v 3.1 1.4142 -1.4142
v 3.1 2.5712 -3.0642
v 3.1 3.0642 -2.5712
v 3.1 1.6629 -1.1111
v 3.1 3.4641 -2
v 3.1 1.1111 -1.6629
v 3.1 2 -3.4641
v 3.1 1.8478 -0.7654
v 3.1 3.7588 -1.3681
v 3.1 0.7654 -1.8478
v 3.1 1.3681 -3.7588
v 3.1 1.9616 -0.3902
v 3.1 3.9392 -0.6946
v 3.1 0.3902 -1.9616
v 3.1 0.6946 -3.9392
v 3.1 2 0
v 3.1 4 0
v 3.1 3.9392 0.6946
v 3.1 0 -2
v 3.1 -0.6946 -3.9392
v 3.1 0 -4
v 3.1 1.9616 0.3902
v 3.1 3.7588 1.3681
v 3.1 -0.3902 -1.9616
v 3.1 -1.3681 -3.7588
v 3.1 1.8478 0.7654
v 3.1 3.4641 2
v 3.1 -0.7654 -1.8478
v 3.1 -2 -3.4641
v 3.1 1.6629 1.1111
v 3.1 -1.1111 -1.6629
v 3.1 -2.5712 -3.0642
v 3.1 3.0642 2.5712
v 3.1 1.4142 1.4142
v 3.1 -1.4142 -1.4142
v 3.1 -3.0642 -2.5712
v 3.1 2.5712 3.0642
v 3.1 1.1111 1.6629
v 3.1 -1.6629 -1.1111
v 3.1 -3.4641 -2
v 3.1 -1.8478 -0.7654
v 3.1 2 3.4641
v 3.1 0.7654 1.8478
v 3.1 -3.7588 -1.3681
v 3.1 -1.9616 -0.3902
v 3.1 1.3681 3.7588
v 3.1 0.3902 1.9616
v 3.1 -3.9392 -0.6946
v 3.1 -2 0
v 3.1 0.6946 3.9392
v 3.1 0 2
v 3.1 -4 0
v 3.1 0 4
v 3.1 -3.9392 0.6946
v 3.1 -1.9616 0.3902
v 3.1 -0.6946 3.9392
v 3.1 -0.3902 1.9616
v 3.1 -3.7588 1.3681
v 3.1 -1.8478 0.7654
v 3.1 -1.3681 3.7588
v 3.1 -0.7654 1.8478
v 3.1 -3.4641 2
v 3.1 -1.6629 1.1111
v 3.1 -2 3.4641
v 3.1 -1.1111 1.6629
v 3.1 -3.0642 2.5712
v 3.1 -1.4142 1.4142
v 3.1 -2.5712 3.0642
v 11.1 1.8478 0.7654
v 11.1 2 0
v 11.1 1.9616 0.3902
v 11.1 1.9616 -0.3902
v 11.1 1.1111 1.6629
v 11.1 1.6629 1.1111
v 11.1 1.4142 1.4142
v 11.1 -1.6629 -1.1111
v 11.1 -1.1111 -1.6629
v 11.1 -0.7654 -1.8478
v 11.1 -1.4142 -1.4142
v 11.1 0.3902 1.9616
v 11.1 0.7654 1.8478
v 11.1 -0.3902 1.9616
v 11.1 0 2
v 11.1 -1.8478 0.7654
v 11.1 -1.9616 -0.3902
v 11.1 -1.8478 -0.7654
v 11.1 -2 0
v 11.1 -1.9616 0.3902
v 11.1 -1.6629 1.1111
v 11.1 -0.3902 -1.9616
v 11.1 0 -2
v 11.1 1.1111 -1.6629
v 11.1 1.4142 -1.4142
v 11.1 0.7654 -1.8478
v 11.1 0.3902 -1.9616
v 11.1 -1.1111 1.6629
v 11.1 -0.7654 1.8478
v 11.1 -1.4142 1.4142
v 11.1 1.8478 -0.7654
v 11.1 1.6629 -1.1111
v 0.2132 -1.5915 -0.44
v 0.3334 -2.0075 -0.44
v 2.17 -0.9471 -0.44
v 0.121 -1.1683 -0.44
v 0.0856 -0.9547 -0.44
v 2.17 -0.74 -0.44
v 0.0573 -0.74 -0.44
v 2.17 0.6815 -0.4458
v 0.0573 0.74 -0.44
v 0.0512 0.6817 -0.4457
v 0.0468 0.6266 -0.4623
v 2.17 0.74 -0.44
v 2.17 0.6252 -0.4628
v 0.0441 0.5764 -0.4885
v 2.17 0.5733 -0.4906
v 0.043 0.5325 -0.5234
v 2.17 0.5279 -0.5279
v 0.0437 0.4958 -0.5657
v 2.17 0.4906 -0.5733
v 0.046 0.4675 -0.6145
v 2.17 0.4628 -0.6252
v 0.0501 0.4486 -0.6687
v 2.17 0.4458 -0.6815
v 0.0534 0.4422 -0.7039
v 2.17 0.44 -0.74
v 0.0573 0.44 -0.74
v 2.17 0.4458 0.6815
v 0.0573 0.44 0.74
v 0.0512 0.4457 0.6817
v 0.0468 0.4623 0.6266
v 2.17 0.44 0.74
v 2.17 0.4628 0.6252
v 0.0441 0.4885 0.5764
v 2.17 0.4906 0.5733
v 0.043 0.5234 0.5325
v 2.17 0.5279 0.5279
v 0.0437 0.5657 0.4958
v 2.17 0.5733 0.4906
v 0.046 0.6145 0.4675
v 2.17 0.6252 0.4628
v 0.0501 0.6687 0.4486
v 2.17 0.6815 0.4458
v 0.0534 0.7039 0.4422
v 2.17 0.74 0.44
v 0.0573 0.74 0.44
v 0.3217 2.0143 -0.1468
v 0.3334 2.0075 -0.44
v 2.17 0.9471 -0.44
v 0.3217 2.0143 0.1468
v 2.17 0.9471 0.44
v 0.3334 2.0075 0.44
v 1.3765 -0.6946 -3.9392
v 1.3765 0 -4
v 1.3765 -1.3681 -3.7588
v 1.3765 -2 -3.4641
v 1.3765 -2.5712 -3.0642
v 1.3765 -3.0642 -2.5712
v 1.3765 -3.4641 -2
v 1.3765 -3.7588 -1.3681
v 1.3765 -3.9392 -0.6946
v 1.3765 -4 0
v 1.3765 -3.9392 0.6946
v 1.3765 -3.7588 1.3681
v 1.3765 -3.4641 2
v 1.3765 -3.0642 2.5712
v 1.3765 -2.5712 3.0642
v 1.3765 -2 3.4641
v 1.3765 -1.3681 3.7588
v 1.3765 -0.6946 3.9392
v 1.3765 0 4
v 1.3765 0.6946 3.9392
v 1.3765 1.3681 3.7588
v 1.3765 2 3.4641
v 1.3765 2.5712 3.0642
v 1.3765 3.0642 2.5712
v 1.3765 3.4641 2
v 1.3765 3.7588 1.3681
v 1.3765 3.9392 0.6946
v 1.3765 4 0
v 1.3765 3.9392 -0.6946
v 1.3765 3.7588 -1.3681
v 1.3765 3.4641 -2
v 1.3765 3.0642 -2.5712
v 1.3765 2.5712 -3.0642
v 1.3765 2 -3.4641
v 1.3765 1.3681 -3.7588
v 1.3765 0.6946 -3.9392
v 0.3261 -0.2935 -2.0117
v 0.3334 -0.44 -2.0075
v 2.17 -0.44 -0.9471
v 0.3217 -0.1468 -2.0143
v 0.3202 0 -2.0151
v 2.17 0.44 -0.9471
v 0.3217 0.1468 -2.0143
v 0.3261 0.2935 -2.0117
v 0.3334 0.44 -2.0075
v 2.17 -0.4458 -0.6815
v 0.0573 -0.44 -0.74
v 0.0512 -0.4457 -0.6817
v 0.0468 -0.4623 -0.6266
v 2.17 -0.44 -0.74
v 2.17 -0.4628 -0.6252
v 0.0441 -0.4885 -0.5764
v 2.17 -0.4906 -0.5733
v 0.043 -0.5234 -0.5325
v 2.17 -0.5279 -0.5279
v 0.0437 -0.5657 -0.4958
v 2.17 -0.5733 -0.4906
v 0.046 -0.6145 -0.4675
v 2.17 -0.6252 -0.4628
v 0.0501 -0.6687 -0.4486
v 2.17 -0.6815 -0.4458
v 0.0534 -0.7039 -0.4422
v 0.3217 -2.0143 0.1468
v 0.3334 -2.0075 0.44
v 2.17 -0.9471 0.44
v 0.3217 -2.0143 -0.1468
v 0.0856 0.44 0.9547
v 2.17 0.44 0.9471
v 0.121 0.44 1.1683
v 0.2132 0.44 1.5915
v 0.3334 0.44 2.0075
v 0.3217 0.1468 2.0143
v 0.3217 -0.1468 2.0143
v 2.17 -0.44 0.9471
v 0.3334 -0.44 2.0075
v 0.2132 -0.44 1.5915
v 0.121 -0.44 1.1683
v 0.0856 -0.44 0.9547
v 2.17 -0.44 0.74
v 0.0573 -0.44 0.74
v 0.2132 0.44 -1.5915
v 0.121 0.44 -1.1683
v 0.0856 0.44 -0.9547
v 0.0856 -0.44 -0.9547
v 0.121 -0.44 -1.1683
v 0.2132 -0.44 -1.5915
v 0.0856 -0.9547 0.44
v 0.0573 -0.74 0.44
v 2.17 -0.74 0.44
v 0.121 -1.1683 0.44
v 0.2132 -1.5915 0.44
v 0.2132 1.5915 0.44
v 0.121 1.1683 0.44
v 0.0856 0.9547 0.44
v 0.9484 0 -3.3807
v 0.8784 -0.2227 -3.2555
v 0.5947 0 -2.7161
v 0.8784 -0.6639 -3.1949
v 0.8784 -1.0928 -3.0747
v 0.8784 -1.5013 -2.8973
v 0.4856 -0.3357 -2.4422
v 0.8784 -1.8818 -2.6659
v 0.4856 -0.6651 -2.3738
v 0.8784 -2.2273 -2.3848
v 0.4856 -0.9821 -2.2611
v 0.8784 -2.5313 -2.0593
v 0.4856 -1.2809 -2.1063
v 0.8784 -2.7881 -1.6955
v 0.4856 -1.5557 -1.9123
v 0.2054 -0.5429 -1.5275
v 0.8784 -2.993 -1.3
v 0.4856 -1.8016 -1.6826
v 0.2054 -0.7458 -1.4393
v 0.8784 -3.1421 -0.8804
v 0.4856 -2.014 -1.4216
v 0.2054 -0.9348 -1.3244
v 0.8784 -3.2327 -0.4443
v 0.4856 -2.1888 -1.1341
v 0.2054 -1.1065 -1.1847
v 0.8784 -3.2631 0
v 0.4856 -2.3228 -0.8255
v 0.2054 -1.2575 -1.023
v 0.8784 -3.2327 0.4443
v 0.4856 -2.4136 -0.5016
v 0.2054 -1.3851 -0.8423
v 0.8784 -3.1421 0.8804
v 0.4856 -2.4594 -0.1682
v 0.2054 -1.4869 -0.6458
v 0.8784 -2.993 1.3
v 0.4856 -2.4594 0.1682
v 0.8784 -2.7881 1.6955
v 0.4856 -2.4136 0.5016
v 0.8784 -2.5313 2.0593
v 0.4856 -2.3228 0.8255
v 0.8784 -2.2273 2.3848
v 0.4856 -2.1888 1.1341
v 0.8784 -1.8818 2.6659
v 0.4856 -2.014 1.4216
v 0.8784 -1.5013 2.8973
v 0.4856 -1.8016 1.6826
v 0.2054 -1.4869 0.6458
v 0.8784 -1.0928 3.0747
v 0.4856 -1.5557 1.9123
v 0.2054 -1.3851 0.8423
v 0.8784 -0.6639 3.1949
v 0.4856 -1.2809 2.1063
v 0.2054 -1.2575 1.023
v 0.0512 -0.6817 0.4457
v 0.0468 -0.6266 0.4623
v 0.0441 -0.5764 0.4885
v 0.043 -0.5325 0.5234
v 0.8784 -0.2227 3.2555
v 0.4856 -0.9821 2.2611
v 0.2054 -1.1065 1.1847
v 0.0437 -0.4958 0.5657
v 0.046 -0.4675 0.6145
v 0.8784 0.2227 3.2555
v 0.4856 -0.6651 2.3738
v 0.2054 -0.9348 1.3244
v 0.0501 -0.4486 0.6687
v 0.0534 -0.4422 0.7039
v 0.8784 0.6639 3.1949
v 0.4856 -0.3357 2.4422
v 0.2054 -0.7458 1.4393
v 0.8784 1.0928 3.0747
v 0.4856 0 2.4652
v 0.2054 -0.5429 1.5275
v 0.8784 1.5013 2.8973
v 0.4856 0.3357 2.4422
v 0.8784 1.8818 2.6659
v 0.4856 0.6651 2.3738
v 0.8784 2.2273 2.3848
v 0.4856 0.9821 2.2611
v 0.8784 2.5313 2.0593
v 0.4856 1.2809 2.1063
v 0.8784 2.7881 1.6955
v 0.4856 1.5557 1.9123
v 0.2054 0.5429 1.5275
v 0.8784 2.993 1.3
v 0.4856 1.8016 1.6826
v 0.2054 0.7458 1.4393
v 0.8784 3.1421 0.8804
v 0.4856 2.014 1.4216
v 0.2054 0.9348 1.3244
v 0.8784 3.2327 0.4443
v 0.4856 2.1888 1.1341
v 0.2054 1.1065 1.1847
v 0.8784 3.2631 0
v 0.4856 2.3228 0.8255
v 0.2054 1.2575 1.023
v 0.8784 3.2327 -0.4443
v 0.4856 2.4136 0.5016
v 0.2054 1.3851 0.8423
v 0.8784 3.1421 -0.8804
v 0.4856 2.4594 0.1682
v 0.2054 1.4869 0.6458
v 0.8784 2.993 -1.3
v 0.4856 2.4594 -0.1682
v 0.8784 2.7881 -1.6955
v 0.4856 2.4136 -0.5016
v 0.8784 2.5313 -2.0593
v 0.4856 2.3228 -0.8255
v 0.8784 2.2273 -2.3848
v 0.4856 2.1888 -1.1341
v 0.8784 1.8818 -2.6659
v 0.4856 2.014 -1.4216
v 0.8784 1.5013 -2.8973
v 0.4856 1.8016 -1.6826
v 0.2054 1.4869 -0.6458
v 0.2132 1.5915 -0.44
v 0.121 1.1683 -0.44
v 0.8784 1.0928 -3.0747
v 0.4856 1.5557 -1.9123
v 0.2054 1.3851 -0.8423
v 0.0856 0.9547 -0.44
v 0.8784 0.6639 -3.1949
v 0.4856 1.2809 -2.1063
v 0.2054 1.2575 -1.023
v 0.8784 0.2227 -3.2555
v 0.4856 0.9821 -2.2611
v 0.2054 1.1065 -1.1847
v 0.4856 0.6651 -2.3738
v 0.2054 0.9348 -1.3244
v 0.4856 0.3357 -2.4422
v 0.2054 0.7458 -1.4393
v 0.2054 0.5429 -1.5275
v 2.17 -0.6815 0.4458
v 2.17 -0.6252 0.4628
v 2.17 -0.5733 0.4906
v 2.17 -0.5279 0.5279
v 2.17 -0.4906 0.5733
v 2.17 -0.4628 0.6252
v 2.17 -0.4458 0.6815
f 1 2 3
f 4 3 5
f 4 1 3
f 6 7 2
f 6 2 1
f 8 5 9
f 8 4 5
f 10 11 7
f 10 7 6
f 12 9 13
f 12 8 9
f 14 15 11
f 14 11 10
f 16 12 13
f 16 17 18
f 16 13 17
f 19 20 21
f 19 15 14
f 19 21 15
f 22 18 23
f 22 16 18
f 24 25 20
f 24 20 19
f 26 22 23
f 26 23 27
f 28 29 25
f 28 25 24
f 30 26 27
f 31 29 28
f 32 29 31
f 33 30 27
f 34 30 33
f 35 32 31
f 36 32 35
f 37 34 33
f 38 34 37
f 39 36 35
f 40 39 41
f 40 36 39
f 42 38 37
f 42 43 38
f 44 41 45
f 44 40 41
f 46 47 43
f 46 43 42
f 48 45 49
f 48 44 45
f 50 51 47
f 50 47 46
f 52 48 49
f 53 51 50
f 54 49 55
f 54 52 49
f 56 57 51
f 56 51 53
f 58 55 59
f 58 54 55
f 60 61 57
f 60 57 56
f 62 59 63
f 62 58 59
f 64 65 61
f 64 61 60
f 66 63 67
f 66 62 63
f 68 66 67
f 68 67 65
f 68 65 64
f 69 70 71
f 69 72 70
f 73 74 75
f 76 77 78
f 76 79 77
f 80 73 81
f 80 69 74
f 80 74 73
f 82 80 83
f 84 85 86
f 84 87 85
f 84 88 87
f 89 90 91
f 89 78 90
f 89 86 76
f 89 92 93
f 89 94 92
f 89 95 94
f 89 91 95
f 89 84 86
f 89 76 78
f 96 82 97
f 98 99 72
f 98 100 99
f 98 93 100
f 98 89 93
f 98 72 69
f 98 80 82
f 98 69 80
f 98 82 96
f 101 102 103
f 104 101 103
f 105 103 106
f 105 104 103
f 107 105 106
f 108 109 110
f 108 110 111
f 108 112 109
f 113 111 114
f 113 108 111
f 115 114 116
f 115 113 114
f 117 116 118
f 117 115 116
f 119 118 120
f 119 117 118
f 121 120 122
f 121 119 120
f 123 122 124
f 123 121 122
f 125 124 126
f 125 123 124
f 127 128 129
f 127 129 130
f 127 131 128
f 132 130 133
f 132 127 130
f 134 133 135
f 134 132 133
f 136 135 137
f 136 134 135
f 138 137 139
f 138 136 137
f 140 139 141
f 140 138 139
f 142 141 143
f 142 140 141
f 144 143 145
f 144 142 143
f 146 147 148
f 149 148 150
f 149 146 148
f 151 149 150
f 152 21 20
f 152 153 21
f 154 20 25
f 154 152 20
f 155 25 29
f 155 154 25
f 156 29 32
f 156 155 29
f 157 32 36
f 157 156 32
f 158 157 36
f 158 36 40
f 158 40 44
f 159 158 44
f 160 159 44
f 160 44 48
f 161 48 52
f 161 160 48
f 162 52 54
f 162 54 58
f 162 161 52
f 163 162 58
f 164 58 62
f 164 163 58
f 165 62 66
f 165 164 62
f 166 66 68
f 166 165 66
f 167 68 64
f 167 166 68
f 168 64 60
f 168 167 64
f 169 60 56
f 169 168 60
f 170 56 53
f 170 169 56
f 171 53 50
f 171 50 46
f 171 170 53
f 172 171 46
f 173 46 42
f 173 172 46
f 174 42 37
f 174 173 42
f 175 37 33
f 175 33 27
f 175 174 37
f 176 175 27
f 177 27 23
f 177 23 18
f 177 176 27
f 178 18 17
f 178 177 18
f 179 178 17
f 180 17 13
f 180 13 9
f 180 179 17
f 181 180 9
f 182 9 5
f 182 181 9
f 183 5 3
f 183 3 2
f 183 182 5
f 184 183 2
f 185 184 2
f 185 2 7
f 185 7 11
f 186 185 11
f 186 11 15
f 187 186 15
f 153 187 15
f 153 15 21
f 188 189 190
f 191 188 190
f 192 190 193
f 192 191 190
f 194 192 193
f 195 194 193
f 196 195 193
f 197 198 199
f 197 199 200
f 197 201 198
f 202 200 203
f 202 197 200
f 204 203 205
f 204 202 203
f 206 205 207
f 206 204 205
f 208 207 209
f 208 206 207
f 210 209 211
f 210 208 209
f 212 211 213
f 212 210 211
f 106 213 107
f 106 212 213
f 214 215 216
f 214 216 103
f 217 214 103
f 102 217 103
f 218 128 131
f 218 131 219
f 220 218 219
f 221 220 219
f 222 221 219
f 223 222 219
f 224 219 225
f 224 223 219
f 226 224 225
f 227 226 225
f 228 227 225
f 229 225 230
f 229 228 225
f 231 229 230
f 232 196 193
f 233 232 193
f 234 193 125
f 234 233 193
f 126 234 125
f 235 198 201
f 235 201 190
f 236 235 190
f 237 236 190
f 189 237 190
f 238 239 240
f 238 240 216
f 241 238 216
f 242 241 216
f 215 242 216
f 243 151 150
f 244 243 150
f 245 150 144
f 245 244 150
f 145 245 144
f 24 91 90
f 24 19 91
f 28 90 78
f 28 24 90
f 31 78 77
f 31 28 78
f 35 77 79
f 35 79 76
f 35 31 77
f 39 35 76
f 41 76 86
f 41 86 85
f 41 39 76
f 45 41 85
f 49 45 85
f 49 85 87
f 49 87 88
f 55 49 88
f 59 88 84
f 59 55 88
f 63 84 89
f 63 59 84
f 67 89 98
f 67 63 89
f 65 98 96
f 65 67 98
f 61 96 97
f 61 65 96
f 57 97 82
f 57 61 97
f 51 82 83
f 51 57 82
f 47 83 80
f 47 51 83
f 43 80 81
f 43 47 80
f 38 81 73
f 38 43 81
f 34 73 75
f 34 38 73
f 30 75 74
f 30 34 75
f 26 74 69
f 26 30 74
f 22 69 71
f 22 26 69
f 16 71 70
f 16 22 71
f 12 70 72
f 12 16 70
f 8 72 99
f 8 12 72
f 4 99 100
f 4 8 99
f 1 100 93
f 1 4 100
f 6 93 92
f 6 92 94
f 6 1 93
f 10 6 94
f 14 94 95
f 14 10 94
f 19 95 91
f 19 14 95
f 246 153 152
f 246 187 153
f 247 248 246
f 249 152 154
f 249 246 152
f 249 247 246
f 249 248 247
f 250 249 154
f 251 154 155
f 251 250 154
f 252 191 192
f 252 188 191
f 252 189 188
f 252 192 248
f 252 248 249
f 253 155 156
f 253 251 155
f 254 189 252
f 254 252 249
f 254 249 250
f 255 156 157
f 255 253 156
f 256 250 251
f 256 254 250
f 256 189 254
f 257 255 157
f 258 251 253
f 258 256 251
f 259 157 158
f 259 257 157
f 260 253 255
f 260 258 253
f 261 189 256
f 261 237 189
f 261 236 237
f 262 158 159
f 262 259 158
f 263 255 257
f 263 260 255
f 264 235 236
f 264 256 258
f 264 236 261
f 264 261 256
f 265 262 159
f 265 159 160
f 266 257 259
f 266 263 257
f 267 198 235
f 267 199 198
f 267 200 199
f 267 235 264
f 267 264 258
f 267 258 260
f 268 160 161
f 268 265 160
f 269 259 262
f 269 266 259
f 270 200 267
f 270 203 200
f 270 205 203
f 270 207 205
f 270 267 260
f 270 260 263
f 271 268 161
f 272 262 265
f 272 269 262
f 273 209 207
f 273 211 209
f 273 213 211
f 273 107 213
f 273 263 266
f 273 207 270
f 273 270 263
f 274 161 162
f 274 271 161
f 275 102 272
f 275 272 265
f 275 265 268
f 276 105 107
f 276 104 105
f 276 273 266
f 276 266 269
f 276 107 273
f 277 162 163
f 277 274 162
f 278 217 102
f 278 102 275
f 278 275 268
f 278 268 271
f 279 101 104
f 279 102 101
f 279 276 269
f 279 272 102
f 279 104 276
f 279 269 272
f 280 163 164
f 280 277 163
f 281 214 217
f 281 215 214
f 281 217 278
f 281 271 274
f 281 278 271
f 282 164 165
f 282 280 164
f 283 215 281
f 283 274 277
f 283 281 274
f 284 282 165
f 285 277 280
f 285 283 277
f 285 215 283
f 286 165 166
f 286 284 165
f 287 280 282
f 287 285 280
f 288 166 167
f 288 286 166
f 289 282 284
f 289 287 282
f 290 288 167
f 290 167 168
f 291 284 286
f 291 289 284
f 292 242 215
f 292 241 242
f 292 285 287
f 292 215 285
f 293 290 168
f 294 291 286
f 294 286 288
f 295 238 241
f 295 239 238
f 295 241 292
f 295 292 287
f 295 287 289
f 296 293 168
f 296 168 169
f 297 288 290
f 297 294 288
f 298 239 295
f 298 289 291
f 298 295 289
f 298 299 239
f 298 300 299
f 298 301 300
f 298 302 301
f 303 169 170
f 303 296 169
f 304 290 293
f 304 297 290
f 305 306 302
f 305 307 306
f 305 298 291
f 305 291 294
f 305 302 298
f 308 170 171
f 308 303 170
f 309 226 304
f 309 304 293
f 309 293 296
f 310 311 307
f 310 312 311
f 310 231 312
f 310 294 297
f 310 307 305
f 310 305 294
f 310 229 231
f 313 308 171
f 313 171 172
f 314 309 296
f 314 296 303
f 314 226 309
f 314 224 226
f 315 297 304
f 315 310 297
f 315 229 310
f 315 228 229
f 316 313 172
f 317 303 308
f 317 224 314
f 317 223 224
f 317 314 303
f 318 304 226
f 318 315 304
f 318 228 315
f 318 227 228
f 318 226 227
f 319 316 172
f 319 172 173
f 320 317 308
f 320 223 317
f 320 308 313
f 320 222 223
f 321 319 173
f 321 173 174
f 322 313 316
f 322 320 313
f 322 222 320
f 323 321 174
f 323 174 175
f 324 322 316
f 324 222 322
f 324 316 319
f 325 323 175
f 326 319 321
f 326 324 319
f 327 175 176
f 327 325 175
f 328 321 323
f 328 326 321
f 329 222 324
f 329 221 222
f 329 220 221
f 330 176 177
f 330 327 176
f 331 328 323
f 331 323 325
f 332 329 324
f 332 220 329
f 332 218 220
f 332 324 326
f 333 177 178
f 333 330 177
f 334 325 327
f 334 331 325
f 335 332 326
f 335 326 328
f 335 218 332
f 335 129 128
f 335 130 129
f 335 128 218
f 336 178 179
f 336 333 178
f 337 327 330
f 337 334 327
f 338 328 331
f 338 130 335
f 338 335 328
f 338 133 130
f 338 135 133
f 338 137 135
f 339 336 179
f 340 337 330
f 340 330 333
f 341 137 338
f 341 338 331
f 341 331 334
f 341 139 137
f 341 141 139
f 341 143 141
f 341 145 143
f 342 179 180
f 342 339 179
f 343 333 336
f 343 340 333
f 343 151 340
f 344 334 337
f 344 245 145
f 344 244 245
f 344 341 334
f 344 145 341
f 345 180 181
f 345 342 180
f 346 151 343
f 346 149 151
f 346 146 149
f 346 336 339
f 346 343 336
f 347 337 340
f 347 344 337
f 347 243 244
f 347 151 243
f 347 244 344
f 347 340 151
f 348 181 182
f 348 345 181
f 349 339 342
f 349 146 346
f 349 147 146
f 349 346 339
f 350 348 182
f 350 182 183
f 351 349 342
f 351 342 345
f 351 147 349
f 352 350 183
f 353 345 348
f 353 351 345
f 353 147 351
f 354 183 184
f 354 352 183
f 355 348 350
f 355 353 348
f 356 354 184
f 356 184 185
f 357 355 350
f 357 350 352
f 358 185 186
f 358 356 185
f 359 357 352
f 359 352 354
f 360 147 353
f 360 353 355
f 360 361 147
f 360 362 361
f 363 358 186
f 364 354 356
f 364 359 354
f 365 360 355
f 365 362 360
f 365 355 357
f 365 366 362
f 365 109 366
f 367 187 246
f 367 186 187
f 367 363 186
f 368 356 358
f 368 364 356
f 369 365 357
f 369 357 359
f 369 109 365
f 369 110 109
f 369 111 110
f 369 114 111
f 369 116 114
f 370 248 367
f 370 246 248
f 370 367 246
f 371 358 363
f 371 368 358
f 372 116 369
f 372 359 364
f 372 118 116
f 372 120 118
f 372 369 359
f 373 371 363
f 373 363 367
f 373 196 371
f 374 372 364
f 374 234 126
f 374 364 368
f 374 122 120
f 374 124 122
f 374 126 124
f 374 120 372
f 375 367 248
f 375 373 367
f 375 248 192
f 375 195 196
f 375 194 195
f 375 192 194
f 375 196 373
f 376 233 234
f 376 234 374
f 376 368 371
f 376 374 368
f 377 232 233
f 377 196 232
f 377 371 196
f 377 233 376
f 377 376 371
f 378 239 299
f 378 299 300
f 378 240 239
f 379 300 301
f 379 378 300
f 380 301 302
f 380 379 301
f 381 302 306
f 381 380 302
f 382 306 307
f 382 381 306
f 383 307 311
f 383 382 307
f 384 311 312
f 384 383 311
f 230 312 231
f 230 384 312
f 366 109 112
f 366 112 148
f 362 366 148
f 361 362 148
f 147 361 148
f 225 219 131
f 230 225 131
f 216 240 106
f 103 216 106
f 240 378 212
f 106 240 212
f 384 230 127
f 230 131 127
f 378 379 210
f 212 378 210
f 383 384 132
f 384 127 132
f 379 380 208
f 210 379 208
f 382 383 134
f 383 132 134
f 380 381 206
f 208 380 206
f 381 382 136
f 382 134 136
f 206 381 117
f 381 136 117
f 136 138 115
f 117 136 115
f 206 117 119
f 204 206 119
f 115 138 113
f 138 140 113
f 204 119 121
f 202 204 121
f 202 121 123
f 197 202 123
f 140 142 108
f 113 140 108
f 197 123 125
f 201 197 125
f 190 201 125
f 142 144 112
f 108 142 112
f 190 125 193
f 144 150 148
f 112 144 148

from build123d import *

# Parameters (mm, degrees)
CROSSRECESS_DEPTH = 2.17
FILLET5_R         = 0.3
DRAFT1_ANGLE      = -30


with BuildPart() as part:
    # Sketch1 → Base (revolve)
    with BuildSketch(Plane.XY, mode=Mode.PRIVATE) as base_sk:
        with BuildLine():
            Line((11.1, 2), (4.5, 2))
            Line((4.5, 2), (3.1, 2))
            Line((3.1, 2), (3.1, 2.35))
            Line((3.1, 2.35), (3.1, 4))
            Line((3.1, 4), (1.376524617, 4))
            ThreePointArc((1.376524617, 4), (0.353757652, 2.115113473), (0, 0))
            Line((0, 0), (11.1, 0))
            Line((11.1, 0), (11.1, 2))
        make_face()
    revolve(base_sk.sketch.rotate(Axis((4.515812911, 0, 0), (-1, 0, 0)), 90), axis=Axis((4.515812911, 0, 0), (-1, 0, 0)))

    # Sketch6 → CrossRecess (cut)
    with BuildSketch(Plane(origin=(0, 0, 0), x_dir=(0, 0, -1), z_dir=(1, 0, 0))):
        Polygon((0.44, 0.44), (0.44, 2.2), (-0.44, 2.2), (-0.44, 0.44), (-2.2, 0.44), (-2.2, -0.44), (-0.44, -0.44), (-0.44, -2.2), (0.44, -2.2), (0.44, -0.44), (2.2, -0.44), (2.2, 0.44), align=None)
    extrude(amount=CROSSRECESS_DEPTH, mode=Mode.SUBTRACT)

    # Fillet5
    fillet5_edges = [part.edges().sort_by_distance(p)[0] for p in [
        (1.099926585, 0.44, 0.44),
        (1.099926585, -0.44, 0.44),
        (1.099926585, -0.44, -0.44),
        (1.099926585, 0.44, -0.44),
    ]]
    fillet(fillet5_edges, radius=FILLET5_R)

    # Draft1
    draft1_faces = [part.faces().sort_by_distance(p)[0] for p in [
        (1.27944778, -2.2, 0),
        (1.27944778, 0, -2.2),
        (1.27944778, 0, 2.2),
        (1.27944778, 2.2, 0),
    ]]
    draft(draft1_faces, Plane(origin=(0, 0, 0), x_dir=(0, 0, 1), z_dir=(1, 0, 0)), DRAFT1_ANGLE)


solid = part.part
